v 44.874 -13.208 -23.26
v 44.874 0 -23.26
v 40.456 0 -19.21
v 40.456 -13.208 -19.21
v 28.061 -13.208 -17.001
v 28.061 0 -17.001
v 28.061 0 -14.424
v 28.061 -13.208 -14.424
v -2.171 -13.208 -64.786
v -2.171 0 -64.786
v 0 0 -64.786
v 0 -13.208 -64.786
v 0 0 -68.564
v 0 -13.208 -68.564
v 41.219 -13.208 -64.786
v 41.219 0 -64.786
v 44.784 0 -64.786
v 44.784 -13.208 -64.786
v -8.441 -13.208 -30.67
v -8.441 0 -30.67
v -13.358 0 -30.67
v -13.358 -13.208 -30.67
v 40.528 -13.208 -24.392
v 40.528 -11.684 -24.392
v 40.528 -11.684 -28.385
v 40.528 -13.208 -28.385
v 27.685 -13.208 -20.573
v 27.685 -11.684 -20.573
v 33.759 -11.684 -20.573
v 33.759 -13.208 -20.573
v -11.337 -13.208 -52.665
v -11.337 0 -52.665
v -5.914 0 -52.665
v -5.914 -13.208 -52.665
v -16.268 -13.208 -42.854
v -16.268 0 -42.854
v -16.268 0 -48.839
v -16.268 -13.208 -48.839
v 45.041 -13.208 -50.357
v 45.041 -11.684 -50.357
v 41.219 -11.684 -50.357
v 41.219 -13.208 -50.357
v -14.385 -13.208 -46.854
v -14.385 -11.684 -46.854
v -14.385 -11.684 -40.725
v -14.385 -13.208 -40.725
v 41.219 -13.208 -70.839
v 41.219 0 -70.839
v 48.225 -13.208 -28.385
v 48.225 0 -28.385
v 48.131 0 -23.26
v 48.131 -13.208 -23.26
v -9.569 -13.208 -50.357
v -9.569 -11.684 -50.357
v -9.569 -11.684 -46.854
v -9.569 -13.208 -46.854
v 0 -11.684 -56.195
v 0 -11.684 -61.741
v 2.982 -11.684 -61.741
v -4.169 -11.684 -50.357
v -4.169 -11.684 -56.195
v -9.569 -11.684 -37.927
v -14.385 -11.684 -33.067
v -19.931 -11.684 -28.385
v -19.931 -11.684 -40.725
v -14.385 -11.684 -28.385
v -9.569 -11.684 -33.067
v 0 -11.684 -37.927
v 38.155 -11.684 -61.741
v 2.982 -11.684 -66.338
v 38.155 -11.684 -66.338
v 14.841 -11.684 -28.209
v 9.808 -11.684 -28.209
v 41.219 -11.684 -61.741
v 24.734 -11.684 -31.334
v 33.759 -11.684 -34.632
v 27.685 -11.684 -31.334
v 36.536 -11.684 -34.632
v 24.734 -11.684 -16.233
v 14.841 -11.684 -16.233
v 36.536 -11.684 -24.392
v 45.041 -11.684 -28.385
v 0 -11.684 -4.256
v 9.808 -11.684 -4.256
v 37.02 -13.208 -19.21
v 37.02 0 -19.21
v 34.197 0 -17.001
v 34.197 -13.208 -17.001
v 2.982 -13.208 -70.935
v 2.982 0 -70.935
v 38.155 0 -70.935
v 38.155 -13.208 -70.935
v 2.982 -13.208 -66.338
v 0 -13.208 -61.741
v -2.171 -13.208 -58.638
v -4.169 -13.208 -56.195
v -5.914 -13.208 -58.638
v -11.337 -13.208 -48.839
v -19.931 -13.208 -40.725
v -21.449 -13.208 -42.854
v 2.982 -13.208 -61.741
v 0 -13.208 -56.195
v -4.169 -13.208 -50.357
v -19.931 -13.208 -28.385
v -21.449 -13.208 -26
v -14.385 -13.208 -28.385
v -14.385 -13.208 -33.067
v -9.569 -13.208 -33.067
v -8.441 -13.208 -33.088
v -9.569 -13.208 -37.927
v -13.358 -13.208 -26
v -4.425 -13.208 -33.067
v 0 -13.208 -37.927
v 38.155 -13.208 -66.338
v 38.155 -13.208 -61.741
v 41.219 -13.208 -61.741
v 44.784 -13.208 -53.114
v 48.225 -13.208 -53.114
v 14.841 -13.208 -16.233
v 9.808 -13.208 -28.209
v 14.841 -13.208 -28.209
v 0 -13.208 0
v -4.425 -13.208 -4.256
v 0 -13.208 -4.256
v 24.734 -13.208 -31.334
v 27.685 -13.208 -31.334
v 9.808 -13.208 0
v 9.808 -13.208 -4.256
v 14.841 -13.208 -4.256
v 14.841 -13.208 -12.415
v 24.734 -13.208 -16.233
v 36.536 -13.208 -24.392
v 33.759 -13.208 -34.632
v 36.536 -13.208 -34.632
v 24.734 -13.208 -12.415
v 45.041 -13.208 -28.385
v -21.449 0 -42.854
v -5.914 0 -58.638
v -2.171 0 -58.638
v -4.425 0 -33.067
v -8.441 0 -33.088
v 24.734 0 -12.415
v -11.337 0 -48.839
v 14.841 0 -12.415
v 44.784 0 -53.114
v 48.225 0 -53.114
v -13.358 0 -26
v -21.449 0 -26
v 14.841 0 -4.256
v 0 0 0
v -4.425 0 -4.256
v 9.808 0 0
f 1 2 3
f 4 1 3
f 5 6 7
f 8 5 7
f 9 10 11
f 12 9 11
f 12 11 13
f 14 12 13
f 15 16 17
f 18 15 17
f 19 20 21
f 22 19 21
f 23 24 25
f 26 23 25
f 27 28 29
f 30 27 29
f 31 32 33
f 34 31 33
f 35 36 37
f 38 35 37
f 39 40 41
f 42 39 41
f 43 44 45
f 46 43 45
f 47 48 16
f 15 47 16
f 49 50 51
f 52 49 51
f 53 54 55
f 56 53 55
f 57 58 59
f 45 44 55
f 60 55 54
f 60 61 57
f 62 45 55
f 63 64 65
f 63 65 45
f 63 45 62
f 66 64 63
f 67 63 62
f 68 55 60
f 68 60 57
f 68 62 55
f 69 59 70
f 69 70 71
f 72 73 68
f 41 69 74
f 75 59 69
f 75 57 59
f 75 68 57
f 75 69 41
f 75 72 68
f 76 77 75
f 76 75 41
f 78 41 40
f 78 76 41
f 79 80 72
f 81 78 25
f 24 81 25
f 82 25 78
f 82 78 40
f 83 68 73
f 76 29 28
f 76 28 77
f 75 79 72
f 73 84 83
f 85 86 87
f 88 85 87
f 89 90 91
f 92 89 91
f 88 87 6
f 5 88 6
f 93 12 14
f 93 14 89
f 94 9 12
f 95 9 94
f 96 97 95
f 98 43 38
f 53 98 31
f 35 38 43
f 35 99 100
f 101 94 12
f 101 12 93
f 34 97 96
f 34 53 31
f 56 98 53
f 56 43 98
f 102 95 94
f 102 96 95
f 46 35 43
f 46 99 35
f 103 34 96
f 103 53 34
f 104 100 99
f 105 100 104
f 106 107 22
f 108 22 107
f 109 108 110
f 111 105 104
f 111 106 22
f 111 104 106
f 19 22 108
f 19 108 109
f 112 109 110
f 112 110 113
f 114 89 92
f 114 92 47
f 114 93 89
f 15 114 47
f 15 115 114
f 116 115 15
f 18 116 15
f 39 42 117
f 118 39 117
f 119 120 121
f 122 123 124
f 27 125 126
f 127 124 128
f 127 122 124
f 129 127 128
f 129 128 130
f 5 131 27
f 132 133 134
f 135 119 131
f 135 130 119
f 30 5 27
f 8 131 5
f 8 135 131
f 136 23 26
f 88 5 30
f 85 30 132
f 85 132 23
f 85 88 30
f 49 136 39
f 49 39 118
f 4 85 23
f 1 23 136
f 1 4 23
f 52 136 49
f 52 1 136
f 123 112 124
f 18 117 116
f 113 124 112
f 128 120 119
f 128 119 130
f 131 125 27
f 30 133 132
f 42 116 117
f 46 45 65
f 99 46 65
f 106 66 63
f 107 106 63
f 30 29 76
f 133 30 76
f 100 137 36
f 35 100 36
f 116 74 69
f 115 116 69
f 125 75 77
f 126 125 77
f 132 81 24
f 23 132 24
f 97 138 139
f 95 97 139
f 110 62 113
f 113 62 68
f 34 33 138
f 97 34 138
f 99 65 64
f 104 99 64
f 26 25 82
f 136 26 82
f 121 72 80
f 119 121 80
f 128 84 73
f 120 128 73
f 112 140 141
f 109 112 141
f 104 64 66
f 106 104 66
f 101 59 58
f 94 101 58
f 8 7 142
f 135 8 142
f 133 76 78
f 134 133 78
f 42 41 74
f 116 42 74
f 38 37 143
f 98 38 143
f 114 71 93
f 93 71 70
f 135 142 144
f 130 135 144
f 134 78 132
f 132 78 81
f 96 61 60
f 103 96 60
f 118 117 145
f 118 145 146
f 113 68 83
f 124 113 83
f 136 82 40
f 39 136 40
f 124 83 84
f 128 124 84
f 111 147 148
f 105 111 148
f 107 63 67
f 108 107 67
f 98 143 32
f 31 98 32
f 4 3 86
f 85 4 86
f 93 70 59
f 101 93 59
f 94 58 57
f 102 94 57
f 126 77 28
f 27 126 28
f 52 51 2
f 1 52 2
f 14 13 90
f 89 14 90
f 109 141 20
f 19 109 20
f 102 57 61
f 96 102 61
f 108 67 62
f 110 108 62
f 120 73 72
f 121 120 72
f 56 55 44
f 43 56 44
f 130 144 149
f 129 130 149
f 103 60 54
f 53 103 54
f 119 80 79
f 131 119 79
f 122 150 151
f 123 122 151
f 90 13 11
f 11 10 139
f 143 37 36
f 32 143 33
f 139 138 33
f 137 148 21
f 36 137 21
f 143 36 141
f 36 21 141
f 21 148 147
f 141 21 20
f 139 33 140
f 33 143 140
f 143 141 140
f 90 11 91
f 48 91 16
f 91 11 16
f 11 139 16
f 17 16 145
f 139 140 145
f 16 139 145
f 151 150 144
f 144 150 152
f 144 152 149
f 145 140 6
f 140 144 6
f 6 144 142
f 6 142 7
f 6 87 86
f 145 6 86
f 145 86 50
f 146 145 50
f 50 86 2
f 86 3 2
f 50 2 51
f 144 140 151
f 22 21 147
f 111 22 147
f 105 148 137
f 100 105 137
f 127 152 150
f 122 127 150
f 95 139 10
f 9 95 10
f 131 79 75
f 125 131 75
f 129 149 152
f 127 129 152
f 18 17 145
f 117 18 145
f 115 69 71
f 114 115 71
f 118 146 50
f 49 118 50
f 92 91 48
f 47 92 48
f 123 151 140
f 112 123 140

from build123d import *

# Parameters (mm, degrees)
F1_DEPTH = 11.684
F2_DEPTH = 13.208


# Not quite as in the source:
# - a feature names something its author has since deleted; it is built from what else it names


with BuildPart() as f1:
    # F0 (on Front) → F1 (new body)
    with BuildSketch(Plane.XZ):
        Polygon((9.8076034337, -4.2564473115), (0, -4.2564473115), (0, -28.2072033733), (0, -37.9272252321), (-4.4246674515, -37.9272252321), (-9.569064714, -37.9272252321), (-9.569064714, -33.0672143027), (-14.3852122128, -33.0672143027), (-14.3852122128, -28.3846426755), (-19.9310798198, -28.3846426755), (-19.9310798198, -40.7246947289), (-14.3852122128, -40.7246947289), (-14.3852122128, -46.85433954), (-9.569064714, -46.85433954), (-9.569064714, -50.3569915891), (-4.1691423394, -50.3569915891), (-4.1691423394, -56.1947450042), (0, -56.1947450042), (0, -61.7406144738), (2.9821074568, -61.7406144738), (2.9821074568, -66.3378462195), (38.154579699, -66.3378462195), (38.154579699, -61.7406144738), (41.2194021046, -61.7406144738), (41.2194021046, -50.3569915891), (45.0411513448, -50.3569915891), (45.0411513448, -28.3846426755), (40.5284799635, -28.3846426755), (40.5284799635, -24.3923105299), (36.5364998579, -24.3923105299), (36.5364998579, -34.6322879195), (33.7594784796, -34.6322879195), (33.7594784796, -24.3923105299), (33.7594784796, -20.5733645707), (27.6847239584, -20.5733645707), (27.6847239584, -31.3338786364), (24.7341338545, -31.3338786364), (24.7341338545, -20.5733645707), (24.7341338545, -16.2325797137), (14.8409679532, -16.2325797137), (14.8409679532, -28.2087121159), (9.8076034337, -28.2087121159), align=None)
    extrude(amount=F1_DEPTH)

    # F0 (on Front) → F2 (join)
    with BuildSketch(Plane.XZ):
        Polygon((9.8076034337, 0), (0, 0), (-4.4246674515, -4.2564473115), (-4.4246674515, -28.2072033733), (-4.4246674515, -33.0672143027), (-8.441273123, -33.0877043307), (-8.441273123, -30.6703820825), (-13.3577445522, -30.6703820825), (-13.3577445522, -26.0001793504), (-21.4487463236, -26.0001793504), (-21.4487463236, -42.8537763655), (-16.2677373737, -42.8537763655), (-16.2677373737, -48.8393343985), (-11.3371098414, -48.8393343985), (-11.3371098414, -52.6647716761), (-5.9138466604, -52.6647716761), (-5.9138466604, -58.6375892162), (-2.1712374873, -58.6375892162), (-2.1712374873, -64.7857561707), (0, -64.7857561707), (0, -68.5636028647), (2.9821074568, -70.9350779653), (38.154579699, -70.9350779653), (41.2194021046, -70.8393231034), (41.2194021046, -64.7857561707), (44.7839312255, -64.7857561707), (44.7839312255, -61.7406144738), (44.7839312255, -53.1140379608), (48.2247062027, -53.1140379608), (48.2247062027, -50.3569915891), (48.2247062027, -28.3846426755), (48.131018877, -23.2601258904), (44.8739007115, -23.2601258904), (40.4558517039, -19.210241735), (37.0195880532, -19.210241735), (34.1969430447, -17.0012172312), (28.0607584864, -17.0012172312), (28.0607584864, -14.4240194932), (24.7341338545, -12.4151380733), (14.8409679532, -12.4151380733), (14.8409679532, -4.2564473115), align=None)
        Polygon((0, -28.2072033733), (0, -4.2564473115), (9.8076034337, -4.2564473115), (9.8076034337, -28.2087121159), (14.8409679532, -28.2087121159), (14.8409679532, -16.2325797137), (24.7341338545, -16.2325797137), (24.7341338545, -20.5733645707), (24.7341338545, -31.3338786364), (27.6847239584, -31.3338786364), (27.6847239584, -20.5733645707), (33.7594784796, -20.5733645707), (33.7594784796, -24.3923105299), (33.7594784796, -34.6322879195), (36.5364998579, -34.6322879195), (36.5364998579, -24.3923105299), (40.5284799635, -24.3923105299), (40.5284799635, -28.3846426755), (45.0411513448, -28.3846426755), (45.0411513448, -50.3569915891), (41.2194021046, -50.3569915891), (41.2194021046, -61.7406144738), (38.154579699, -61.7406144738), (38.154579699, -66.3378462195), (2.9821074568, -66.3378462195), (2.9821074568, -61.7406144738), (0, -61.7406144738), (0, -56.1947450042), (-4.1691423394, -56.1947450042), (-4.1691423394, -50.3569915891), (-9.569064714, -50.3569915891), (-9.569064714, -46.85433954), (-14.3852122128, -46.85433954), (-14.3852122128, -40.7246947289), (-19.9310798198, -40.7246947289), (-19.9310798198, -28.3846426755), (-14.3852122128, -28.3846426755), (-14.3852122128, -33.0672143027), (-9.569064714, -33.0672143027), (-9.569064714, -37.9272252321), (-4.4246674515, -37.9272252321), (0, -37.9272252321), align=None, mode=Mode.SUBTRACT)
    extrude(amount=F2_DEPTH)


solid = f1.part
